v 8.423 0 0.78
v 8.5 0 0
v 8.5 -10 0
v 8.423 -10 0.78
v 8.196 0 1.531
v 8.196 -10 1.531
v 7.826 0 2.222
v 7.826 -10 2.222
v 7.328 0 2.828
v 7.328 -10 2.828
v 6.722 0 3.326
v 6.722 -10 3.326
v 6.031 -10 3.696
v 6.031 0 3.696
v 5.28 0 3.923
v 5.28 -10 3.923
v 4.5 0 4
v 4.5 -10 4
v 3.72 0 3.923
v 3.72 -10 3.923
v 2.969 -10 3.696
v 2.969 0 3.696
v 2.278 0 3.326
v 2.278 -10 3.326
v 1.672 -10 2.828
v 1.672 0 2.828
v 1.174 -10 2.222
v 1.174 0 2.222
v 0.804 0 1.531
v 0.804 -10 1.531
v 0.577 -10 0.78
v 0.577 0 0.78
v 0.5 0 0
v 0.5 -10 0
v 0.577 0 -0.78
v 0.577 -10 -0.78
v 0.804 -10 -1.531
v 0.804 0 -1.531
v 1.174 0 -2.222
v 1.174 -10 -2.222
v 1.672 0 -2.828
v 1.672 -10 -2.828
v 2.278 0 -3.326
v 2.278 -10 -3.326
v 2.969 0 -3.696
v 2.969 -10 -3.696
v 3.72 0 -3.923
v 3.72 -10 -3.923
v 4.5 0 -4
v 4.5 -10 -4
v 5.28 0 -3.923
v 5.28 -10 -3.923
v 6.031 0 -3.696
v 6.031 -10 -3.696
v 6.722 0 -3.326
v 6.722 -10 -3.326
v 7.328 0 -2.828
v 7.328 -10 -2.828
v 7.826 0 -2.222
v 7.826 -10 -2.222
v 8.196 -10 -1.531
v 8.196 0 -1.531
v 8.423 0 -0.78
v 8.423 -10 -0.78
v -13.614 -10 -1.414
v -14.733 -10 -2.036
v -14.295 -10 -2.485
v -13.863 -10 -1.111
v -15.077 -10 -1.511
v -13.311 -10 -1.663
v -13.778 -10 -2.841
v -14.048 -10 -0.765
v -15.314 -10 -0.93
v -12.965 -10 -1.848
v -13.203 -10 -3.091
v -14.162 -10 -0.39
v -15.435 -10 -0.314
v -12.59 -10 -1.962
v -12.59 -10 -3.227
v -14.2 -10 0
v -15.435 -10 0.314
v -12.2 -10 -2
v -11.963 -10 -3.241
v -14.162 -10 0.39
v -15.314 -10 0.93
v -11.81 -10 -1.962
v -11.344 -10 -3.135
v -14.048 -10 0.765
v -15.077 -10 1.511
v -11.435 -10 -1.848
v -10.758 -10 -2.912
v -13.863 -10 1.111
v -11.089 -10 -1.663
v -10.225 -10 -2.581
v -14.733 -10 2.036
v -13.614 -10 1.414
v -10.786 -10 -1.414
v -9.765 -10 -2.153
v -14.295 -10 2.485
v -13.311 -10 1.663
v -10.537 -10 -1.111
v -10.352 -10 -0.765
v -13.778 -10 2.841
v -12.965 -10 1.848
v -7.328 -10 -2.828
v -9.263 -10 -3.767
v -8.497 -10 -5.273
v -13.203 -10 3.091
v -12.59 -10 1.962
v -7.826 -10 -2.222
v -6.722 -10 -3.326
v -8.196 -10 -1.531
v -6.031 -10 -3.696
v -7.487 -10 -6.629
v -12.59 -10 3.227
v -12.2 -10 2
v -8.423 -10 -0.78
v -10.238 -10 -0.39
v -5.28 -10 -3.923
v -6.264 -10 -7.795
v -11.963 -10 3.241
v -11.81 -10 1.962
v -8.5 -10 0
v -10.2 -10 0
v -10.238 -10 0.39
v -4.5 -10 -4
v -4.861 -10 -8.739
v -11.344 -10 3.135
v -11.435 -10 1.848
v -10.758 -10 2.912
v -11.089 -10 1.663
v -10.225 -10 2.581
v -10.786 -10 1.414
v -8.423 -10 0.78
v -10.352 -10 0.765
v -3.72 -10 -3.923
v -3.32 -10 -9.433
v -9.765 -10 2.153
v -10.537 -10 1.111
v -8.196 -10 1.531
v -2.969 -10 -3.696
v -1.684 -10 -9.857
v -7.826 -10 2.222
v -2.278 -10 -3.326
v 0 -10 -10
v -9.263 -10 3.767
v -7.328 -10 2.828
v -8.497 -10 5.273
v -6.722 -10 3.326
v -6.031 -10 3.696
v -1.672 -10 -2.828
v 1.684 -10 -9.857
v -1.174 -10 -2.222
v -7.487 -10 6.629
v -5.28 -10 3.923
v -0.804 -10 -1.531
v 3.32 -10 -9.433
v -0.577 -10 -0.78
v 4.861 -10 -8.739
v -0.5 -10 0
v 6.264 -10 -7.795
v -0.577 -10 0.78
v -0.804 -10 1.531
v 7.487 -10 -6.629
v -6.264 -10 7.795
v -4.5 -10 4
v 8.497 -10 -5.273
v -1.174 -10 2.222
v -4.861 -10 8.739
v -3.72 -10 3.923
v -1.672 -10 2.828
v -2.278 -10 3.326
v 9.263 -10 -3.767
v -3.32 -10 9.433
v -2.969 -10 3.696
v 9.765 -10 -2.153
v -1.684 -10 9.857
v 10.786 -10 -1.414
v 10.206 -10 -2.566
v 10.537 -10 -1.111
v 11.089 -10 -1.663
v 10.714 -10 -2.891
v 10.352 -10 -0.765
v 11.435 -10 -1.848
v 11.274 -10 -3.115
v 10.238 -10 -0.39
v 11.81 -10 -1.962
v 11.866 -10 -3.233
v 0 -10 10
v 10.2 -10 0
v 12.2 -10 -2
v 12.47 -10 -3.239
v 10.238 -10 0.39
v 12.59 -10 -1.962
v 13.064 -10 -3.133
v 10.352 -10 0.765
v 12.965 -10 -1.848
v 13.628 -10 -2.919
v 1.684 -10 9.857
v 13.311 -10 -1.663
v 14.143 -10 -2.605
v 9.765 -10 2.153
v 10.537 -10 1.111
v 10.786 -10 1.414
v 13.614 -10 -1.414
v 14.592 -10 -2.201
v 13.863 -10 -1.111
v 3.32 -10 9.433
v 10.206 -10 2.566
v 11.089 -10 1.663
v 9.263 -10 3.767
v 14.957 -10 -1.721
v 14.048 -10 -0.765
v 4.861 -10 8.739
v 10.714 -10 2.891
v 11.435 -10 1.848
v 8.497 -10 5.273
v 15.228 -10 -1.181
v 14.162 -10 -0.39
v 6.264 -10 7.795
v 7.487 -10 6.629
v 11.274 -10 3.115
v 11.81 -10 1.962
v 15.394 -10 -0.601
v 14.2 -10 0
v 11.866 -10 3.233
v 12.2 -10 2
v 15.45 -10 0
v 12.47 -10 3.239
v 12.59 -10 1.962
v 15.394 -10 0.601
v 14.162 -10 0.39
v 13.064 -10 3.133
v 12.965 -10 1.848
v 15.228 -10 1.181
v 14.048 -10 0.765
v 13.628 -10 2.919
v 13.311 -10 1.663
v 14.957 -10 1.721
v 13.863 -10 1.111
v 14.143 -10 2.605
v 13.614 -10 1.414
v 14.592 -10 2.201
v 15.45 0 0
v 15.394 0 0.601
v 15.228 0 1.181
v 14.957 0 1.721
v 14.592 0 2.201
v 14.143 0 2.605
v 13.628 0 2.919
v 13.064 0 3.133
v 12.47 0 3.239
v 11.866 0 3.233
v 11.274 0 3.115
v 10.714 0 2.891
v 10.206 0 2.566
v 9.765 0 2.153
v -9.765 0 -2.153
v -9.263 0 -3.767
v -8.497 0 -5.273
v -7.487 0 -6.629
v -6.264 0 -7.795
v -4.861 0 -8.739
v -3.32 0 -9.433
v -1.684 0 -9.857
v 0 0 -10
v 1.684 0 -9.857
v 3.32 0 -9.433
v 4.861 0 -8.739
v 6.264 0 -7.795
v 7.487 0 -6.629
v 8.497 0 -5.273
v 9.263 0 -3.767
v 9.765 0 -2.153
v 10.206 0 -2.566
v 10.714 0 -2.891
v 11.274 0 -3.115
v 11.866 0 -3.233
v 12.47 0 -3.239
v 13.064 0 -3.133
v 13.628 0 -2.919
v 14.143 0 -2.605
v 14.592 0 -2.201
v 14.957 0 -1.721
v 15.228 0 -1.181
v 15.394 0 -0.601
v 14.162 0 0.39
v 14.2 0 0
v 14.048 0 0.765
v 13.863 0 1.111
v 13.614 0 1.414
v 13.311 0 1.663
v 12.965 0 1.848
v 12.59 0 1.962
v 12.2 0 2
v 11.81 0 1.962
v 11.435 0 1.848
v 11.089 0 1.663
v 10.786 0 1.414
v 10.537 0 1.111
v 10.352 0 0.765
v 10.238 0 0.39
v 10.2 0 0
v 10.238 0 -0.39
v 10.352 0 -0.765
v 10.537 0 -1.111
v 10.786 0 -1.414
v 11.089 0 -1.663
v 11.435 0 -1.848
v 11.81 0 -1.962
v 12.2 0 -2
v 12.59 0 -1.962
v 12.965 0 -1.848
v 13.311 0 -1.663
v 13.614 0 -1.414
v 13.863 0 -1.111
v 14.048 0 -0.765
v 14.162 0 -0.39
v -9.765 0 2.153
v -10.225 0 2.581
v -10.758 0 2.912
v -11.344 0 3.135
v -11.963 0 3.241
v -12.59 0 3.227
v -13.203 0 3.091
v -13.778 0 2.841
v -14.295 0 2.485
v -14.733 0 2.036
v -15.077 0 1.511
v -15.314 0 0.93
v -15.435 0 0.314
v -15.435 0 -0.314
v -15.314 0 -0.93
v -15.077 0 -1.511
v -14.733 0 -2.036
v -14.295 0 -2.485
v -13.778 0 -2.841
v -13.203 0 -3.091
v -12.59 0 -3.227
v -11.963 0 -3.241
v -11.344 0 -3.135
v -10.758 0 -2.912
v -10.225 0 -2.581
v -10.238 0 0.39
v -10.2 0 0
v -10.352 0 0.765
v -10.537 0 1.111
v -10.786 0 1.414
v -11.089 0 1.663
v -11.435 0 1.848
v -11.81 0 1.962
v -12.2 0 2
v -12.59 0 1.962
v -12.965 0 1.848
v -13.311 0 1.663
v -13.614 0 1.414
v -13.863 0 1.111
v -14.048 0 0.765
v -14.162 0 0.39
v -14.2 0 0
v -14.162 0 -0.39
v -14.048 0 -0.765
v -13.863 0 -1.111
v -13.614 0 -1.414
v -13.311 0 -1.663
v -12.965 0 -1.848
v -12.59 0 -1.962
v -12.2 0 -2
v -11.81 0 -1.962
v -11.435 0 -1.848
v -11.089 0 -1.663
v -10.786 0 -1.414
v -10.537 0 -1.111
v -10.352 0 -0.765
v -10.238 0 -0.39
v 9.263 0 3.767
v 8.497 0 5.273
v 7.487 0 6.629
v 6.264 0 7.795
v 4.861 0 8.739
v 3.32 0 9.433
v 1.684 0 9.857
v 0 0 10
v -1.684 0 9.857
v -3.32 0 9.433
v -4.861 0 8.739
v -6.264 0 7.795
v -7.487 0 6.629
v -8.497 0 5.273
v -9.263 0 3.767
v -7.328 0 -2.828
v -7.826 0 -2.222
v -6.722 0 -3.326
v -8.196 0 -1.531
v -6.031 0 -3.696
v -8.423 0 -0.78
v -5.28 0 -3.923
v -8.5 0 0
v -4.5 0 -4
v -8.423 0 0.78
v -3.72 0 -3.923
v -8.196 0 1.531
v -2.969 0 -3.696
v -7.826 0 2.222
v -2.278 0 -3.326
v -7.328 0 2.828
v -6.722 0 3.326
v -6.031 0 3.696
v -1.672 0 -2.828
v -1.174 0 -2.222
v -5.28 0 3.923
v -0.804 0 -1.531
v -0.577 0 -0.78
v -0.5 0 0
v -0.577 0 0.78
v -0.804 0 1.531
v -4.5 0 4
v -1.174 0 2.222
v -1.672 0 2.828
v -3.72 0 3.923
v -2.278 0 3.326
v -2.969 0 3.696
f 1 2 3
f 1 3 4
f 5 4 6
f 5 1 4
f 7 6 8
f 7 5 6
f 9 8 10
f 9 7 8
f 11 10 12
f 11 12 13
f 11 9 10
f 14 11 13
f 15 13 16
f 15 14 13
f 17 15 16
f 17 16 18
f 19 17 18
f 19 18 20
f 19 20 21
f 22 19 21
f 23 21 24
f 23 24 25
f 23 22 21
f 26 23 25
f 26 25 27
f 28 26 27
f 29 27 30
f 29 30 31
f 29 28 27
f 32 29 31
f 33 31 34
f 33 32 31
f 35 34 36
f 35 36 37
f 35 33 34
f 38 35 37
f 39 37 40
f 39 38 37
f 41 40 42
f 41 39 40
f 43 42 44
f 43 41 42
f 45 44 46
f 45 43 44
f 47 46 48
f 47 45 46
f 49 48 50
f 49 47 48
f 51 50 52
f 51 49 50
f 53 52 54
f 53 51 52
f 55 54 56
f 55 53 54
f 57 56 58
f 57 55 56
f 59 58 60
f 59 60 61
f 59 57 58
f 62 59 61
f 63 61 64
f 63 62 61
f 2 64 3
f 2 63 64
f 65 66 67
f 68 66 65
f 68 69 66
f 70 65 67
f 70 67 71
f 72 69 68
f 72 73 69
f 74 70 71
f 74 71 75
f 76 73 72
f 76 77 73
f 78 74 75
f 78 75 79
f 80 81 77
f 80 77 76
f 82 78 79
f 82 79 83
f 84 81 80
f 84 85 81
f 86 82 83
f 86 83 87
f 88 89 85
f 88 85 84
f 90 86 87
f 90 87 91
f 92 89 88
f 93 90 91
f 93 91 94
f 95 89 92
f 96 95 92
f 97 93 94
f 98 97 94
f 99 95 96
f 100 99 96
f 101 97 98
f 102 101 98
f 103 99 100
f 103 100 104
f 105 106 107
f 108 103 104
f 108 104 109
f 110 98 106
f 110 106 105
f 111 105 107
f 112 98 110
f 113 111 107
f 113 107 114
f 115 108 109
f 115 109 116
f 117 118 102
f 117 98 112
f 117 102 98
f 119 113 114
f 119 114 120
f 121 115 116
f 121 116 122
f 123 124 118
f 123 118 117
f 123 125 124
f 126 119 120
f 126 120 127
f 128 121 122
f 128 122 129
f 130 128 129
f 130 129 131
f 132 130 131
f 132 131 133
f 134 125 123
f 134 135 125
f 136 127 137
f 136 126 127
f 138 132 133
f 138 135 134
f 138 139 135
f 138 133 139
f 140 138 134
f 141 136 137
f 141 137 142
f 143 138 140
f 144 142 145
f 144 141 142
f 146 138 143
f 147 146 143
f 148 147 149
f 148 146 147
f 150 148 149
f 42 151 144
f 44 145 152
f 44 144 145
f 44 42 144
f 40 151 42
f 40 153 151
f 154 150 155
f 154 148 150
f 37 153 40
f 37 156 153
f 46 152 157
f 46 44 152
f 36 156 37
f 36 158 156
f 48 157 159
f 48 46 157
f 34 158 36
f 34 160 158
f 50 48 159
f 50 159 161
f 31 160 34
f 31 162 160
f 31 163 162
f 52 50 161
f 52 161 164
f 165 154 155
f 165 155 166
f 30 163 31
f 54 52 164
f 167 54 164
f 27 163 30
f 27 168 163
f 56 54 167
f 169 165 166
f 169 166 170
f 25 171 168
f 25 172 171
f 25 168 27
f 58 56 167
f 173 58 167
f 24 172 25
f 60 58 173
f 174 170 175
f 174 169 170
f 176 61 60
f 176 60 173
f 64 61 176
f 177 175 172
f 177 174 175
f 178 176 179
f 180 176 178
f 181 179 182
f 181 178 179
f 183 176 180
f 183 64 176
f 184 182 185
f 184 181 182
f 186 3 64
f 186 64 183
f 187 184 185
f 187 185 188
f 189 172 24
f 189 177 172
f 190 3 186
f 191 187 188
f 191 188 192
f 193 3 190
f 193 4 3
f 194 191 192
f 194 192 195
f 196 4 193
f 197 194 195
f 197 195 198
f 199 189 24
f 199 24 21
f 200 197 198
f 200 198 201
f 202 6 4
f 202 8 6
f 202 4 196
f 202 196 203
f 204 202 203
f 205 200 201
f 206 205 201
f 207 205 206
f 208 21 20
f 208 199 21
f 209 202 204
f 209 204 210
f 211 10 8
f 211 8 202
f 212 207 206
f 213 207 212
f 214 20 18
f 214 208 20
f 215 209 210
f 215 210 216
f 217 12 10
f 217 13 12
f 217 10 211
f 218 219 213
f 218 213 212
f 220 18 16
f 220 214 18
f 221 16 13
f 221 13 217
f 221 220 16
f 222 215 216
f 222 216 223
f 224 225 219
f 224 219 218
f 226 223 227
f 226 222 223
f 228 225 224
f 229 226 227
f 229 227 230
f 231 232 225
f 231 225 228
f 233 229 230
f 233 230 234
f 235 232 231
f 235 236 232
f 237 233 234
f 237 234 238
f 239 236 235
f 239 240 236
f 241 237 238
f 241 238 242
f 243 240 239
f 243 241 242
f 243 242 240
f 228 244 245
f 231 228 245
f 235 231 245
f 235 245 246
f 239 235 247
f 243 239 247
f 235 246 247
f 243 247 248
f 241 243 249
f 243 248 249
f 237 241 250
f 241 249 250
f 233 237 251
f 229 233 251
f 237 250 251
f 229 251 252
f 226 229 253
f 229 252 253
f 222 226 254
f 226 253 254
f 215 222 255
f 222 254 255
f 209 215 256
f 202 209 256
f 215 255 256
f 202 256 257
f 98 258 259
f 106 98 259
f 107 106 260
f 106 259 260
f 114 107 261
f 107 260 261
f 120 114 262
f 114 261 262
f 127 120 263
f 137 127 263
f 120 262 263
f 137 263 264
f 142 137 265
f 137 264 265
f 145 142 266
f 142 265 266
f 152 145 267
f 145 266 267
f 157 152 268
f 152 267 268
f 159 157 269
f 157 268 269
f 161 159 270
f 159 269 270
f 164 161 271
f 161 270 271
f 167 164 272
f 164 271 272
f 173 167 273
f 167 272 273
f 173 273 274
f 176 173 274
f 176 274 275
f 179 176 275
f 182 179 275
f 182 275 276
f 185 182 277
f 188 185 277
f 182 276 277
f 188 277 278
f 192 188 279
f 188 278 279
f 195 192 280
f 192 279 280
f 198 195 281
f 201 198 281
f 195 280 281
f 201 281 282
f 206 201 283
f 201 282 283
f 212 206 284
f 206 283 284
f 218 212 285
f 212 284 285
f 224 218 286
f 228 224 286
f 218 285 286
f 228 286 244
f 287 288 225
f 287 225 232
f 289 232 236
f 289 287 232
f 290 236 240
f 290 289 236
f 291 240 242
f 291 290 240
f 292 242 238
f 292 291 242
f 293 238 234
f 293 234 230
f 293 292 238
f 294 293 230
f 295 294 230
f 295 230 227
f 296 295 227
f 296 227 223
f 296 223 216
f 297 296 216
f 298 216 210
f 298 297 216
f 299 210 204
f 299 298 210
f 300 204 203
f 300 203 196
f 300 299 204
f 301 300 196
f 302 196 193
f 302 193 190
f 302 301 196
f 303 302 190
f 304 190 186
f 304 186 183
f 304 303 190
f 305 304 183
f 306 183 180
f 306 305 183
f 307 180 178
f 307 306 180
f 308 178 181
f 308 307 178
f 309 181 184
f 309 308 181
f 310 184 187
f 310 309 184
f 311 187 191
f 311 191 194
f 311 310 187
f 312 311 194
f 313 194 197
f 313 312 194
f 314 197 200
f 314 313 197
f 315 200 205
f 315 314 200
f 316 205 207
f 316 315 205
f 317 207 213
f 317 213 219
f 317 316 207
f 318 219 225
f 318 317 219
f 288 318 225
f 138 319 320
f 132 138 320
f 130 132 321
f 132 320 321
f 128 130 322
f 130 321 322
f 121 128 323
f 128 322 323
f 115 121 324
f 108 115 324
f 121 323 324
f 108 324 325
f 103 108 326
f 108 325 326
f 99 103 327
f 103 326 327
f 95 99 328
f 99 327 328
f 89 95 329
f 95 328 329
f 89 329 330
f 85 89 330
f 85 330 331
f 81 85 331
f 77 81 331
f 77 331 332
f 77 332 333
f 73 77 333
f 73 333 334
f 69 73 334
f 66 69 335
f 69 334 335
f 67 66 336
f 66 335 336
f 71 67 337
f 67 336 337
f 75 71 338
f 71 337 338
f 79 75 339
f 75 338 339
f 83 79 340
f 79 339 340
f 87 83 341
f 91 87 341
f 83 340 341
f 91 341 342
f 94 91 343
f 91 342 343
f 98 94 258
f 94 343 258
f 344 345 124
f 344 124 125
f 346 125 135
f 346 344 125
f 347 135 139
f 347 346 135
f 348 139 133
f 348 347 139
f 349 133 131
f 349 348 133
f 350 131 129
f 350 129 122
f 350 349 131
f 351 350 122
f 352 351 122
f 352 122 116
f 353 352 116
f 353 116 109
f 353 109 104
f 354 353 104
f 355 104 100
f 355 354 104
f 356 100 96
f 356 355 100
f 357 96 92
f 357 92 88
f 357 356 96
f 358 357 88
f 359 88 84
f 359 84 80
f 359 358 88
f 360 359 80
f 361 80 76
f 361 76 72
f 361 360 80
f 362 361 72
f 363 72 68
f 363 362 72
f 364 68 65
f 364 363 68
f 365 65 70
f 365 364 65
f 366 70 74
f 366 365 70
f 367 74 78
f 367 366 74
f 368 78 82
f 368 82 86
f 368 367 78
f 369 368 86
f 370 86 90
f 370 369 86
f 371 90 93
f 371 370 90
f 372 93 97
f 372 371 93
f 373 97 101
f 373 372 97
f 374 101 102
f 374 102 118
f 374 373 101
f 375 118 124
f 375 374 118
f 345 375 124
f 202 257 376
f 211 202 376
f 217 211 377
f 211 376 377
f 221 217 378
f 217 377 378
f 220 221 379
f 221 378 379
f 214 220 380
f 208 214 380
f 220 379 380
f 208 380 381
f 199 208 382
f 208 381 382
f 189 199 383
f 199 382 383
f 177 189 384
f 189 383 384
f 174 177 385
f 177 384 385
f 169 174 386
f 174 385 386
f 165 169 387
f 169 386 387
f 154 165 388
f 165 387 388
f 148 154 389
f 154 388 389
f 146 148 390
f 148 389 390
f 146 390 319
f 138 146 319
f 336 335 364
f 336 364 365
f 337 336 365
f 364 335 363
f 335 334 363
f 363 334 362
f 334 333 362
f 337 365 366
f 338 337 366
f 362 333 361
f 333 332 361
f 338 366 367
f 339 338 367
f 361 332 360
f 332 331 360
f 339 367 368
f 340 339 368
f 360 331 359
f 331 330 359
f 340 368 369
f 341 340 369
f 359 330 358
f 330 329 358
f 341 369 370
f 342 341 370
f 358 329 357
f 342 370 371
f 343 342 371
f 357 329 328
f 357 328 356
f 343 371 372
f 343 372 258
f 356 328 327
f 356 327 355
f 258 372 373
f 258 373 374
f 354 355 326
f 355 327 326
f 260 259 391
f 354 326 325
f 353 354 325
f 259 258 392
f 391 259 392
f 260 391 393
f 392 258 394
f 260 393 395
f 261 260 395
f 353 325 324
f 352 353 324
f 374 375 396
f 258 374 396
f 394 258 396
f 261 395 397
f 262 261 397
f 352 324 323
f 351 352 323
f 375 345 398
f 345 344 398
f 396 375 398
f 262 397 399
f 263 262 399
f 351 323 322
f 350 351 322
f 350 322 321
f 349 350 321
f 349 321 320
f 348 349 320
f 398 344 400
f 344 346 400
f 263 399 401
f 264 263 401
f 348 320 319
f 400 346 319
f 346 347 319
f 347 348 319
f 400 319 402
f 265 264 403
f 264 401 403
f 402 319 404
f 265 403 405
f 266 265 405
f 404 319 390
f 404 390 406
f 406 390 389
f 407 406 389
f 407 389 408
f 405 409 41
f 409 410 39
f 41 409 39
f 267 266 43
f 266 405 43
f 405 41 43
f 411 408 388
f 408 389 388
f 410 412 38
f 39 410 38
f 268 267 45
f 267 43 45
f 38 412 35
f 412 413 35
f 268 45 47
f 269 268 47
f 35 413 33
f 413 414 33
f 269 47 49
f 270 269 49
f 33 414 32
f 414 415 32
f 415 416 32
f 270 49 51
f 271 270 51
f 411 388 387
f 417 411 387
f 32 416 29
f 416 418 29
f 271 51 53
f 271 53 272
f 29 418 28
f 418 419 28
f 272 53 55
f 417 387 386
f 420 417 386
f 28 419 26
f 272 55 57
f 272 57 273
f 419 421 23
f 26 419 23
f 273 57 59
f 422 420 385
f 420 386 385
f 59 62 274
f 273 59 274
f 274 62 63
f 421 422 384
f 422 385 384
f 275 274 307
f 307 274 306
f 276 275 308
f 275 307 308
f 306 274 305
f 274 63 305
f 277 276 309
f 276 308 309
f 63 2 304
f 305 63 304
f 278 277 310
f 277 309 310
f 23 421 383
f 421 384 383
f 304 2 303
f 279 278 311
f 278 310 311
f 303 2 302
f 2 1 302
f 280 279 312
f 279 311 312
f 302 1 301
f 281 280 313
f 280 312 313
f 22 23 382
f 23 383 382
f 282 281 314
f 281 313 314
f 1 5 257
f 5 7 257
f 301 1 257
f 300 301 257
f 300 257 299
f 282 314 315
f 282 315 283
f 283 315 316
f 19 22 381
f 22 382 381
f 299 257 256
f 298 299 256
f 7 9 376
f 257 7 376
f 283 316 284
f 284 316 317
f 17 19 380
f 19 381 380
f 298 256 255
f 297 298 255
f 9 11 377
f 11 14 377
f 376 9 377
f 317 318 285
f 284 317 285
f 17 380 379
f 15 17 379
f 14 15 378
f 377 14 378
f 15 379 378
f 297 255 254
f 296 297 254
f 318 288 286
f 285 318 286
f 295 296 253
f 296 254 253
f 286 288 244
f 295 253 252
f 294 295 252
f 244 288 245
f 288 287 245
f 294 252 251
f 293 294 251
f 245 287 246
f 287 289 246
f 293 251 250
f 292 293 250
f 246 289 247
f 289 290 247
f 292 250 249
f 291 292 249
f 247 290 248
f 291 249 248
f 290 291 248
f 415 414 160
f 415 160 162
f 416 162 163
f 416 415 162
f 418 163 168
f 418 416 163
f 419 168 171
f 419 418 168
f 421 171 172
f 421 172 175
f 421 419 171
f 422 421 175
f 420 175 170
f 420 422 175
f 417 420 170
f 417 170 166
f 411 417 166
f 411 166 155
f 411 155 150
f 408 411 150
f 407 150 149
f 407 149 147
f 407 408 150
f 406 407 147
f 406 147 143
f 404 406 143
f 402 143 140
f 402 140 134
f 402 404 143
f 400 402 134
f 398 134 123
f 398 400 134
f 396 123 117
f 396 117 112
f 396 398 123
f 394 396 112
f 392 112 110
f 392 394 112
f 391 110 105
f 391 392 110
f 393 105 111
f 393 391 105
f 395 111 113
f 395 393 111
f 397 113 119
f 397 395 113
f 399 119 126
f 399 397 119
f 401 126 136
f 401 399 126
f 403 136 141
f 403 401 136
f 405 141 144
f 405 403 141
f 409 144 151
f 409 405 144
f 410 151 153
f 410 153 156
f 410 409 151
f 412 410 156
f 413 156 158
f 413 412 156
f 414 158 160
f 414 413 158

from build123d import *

# Parameters (mm, degrees)
F0_R     = 4
F1_DEPTH = 10
F0_R_2   = 2
F2_DEPTH = 10
F3_DEPTH = 10


with BuildPart() as f1:
    # F0 (on Front) → F1 (new body)
    with BuildSketch(Plane.XZ):
        with BuildLine():
            ThreePointArc((9.7654713115, -2.1530374044), (8.95, 0), (9.7654713115, 2.1530374044))
            ThreePointArc((9.7654713115, 2.1530374044), (0, 10), (-9.7654713115, 2.1530374044))
            ThreePointArc((-9.7654713115, 2.1530374044), (-9.1606975934, 1.1511476366), (-8.95, 0))
            ThreePointArc((-8.95, 0), (-9.1606975934, -1.1511476366), (-9.7654713115, -2.1530374044))
            ThreePointArc((-9.7654713115, -2.1530374044), (0, -10), (9.7654713115, -2.1530374044))
        make_face()
        with Locations((-4.5, 0)):
            Circle(F0_R, mode=Mode.SUBTRACT)
        with Locations((4.5, 0)):
            Circle(F0_R, mode=Mode.SUBTRACT)
    extrude(amount=F1_DEPTH)

    # F0 (on Front) → F2 (join)
    with BuildSketch(Plane.XZ):
        with BuildLine():
            ThreePointArc((-9.7654713115, -2.1530374044), (-10, 0), (-9.7654713115, 2.1530374044))
            ThreePointArc((-9.7654713115, 2.1530374044), (-15.45, 0), (-9.7654713115, -2.1530374044))
        make_face()
        with Locations((-12.2, 0)):
            Circle(F0_R_2, mode=Mode.SUBTRACT)
        with BuildLine():
            ThreePointArc((9.7654713115, 2.1530374044), (9.941194926, 1.082886625), (10, 0))
            ThreePointArc((10, 0), (9.941194926, -1.082886625), (9.7654713115, -2.1530374044))
            ThreePointArc((9.7654713115, -2.1530374044), (13.3511476366, -3.0393024066), (15.45, 0))
            ThreePointArc((15.45, 0), (13.3511476366, 3.0393024066), (9.7654713115, 2.1530374044))
        make_face()
        with Locations((12.2, 0)):
            Circle(F0_R_2, mode=Mode.SUBTRACT)
    extrude(amount=F2_DEPTH)

    # F0 (on Front) → F3 (join)
    with BuildSketch(Plane.XZ):
        with BuildLine():
            ThreePointArc((9.7654713115, -2.1530374044), (9.941194926, -1.082886625), (10, 0))
            ThreePointArc((10, 0), (9.941194926, 1.082886625), (9.7654713115, 2.1530374044))
            ThreePointArc((9.7654713115, 2.1530374044), (8.95, 0), (9.7654713115, -2.1530374044))
        make_face()
        with BuildLine():
            ThreePointArc((-8.95, 0), (-9.1606975934, 1.1511476366), (-9.7654713115, 2.1530374044))
            ThreePointArc((-9.7654713115, 2.1530374044), (-10, 0), (-9.7654713115, -2.1530374044))
            ThreePointArc((-9.7654713115, -2.1530374044), (-9.1606975934, -1.1511476366), (-8.95, 0))
        make_face()
    extrude(amount=F3_DEPTH)


solid = f1.part
